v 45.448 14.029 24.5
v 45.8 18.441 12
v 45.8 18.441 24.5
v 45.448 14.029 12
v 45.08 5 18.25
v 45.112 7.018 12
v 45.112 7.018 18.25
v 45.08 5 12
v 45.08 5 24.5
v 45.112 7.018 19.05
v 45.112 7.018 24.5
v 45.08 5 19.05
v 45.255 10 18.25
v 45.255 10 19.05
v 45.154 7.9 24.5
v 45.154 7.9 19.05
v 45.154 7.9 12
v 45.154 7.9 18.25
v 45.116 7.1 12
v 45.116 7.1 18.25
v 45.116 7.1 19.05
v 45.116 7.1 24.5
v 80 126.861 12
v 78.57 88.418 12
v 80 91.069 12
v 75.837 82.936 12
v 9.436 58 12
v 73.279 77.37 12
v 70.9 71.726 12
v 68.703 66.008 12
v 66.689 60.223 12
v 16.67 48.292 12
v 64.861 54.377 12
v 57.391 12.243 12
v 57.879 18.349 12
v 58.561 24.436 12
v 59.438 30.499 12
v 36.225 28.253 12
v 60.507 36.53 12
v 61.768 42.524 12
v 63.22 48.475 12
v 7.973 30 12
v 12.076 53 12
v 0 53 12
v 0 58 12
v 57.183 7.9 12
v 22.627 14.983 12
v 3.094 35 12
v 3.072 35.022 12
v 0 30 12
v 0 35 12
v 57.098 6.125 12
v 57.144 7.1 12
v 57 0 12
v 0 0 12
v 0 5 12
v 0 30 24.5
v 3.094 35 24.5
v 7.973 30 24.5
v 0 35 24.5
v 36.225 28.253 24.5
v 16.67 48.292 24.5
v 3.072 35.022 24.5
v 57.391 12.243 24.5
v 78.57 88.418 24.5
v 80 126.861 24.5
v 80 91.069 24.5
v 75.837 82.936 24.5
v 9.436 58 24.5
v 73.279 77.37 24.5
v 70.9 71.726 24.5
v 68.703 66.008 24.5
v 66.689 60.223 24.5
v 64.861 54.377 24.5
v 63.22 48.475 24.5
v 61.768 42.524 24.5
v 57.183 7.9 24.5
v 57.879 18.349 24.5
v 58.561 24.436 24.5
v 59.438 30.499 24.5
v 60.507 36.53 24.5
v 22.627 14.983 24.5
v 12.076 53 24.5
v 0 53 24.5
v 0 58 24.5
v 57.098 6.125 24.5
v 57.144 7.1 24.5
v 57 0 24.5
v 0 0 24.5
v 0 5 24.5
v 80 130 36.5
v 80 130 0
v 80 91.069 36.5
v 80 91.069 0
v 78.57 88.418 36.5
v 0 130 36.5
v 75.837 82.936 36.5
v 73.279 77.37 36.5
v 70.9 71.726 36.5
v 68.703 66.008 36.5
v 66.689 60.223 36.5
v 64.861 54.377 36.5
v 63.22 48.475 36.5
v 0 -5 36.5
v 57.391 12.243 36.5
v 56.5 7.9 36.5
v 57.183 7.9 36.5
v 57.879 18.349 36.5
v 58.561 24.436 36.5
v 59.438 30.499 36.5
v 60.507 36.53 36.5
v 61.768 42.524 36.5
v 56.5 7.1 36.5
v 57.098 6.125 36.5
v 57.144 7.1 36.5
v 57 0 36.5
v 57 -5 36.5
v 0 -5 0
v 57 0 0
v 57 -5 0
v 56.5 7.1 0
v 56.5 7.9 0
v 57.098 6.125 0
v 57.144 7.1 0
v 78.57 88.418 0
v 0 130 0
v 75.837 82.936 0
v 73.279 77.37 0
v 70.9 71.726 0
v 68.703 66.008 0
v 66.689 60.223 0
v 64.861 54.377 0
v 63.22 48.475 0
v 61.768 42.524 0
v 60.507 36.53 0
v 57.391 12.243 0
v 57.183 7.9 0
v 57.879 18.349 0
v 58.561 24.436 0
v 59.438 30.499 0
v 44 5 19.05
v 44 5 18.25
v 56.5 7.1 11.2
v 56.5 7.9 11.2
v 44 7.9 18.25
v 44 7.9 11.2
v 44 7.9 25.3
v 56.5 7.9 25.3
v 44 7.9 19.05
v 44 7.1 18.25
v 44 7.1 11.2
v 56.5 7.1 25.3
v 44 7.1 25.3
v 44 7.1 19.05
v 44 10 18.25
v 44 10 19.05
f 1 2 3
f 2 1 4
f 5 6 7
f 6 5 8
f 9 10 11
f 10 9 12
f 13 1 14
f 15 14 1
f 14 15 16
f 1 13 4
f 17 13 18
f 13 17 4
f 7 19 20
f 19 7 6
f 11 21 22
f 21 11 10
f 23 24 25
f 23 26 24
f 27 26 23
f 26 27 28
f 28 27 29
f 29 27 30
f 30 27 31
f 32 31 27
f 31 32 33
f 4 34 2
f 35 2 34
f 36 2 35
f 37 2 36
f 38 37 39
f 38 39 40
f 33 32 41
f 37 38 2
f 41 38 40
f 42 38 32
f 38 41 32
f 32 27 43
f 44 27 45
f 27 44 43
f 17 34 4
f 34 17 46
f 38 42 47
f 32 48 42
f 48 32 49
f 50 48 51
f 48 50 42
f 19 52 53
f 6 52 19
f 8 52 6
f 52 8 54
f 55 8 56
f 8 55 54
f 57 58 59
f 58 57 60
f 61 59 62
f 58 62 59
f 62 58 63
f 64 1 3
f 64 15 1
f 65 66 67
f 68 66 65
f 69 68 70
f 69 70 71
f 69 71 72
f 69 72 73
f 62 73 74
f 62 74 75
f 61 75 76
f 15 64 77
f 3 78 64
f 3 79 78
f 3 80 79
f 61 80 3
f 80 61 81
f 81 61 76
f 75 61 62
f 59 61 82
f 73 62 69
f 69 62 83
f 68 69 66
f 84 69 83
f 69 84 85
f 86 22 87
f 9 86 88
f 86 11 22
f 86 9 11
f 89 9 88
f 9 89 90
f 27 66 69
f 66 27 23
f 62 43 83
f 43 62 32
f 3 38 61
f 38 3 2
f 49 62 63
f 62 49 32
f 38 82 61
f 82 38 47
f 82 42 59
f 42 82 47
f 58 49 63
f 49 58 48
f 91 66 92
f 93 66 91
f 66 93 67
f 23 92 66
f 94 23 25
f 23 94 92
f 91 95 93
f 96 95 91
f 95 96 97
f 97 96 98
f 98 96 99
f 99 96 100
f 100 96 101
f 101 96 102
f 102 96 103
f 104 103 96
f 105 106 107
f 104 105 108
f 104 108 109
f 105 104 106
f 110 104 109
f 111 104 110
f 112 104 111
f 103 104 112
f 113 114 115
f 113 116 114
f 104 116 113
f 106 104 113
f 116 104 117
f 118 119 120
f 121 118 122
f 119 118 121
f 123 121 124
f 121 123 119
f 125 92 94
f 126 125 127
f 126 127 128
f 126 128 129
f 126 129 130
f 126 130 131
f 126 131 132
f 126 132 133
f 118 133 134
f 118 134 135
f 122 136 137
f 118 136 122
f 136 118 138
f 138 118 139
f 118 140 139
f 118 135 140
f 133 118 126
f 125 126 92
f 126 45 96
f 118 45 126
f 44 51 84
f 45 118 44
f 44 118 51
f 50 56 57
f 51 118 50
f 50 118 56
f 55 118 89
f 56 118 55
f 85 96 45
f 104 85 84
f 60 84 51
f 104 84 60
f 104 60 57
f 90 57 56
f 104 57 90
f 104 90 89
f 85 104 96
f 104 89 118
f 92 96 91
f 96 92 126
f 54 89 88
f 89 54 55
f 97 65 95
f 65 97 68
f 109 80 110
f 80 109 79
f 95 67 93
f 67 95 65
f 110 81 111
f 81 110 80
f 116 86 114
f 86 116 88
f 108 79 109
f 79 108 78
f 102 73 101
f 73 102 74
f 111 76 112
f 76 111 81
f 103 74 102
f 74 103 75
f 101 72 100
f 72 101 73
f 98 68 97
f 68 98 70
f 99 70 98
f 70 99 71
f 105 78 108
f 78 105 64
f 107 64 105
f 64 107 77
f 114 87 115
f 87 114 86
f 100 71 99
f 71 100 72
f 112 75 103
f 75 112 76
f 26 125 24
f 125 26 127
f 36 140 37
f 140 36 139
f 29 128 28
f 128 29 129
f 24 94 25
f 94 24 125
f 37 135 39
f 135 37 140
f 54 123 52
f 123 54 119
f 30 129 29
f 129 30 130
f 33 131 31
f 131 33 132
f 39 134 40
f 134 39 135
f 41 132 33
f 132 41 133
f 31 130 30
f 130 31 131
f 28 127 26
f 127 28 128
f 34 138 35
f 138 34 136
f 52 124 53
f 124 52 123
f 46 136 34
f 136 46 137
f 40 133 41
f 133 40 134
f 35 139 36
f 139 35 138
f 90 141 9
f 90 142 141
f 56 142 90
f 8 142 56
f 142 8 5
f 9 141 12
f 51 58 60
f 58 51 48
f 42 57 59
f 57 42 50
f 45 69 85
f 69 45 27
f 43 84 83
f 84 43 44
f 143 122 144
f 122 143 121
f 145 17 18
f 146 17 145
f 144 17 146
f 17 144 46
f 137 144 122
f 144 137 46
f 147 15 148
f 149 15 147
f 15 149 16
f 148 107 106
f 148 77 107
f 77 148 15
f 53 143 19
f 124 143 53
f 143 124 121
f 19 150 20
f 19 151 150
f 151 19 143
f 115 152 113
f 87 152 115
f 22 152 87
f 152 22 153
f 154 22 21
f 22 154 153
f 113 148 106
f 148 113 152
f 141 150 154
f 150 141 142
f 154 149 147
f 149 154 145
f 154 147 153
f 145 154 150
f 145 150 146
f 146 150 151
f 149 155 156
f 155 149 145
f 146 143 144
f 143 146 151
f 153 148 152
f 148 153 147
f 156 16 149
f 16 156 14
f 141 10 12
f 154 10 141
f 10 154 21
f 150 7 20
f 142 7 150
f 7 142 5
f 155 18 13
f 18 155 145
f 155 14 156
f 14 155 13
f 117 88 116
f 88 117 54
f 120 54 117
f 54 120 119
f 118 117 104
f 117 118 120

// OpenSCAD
// Copyright 2024 Martin Scheidt (Attribution 4.0 International, CC-BY 4.0)
//
// You are free to copy and redistribute the material in any medium or format.
// You are free to remix, transform, and build upon the material for any purpose, even commercially.
// You must give appropriate credit, provide a link to the license, and indicate if changes were made.
// You may not apply legal terms or technological measures that legally restrict others from doing anything the license permits.
// No warranties are given.

include<./specification_of_components.scad>

$fn = 200;
module switch_shape(){
    translate([dtc_outer_radius+45,0,dtc_cutout_z_pos]) rotate([0,0,180-curve_angle])union(){
        rotate_extrude(angle = curve_angle) square([dtc_outer_radius, dtc_cutout_height]);
        translate([dtc_outer_radius-rail_width-15,0,0])cube([rail_width+15, straight_length, dsc_depth]);
        translate([dtc_outer_radius-(rail_width-12)-12,0,0]) cube([rail_width-12,straight_length+19,dsc_depth]);
    }
}

module drill_template_switch(){
difference(){
    cube([80,130,dtc_height]);
    switch_shape();
    
    // curved sides
    translate([24+dtc_outer_radius+dsg_thickness,0,dtc_cutout_z_pos+dtc_cutout_height])rotate([0,0,180-curve_angle])rotate_extrude(angle = curve_angle) square([dtc_middle_radius, dtc_cutout_z_pos]);
    translate([24+dtc_outer_radius+dsg_thickness,0,0])rotate([0,0,180-curve_angle])rotate_extrude(angle = curve_angle) square([dtc_middle_radius, dtc_cutout_z_pos]);
    
    // ground holes
    translate([0,0,dtc_cutout_z_pos])cube([80, dsg_hole_depth, dtc_cutout_height]);
    translate([0,30,dtc_cutout_z_pos])cube([60, dsg_hole_depth, dtc_cutout_height]);
    translate([0,53,dtc_cutout_z_pos])cube([60, dsg_hole_depth, dtc_cutout_height]);
    
    // hole position lines
    translate([56.5, dtch_y_pos-thin_line/2, dtc_cutout_z_pos-dtc_cutout_height]) cube([2*thin_line, thin_line, dtc_cutout_height]);
    translate([56.5, dtch_y_pos-thin_line/2, dtc_cutout_z_pos+dtc_cutout_height]) cube([2*thin_line, thin_line, dtc_cutout_height]);
    translate([44, dtch_y_pos-thin_line/2, dtc_cutout_z_pos]) cube([2*thin_line, thin_line, dtc_cutout_height]);
    translate([44, dtch_y_pos-thin_line/2,dtc_cutout_z_pos-thin_line])cube([dtc_cutout_z_pos+5, thin_line, thin_line]);
    translate([44, dtch_y_pos-thin_line/2,dtc_cutout_z_pos+dtc_cutout_height])cube([dtc_cutout_z_pos+5, thin_line, thin_line]);
    translate([44, dtch_y_pos-5/2, dtc_cutout_z_pos+dtch_z_pos]) cube([2*thin_line, 5, thin_line]);
    
}
translate([0,-5,0]) cube([45+12, 5,dtc_height]);
}
//switch_shape();

drill_template_switch();
